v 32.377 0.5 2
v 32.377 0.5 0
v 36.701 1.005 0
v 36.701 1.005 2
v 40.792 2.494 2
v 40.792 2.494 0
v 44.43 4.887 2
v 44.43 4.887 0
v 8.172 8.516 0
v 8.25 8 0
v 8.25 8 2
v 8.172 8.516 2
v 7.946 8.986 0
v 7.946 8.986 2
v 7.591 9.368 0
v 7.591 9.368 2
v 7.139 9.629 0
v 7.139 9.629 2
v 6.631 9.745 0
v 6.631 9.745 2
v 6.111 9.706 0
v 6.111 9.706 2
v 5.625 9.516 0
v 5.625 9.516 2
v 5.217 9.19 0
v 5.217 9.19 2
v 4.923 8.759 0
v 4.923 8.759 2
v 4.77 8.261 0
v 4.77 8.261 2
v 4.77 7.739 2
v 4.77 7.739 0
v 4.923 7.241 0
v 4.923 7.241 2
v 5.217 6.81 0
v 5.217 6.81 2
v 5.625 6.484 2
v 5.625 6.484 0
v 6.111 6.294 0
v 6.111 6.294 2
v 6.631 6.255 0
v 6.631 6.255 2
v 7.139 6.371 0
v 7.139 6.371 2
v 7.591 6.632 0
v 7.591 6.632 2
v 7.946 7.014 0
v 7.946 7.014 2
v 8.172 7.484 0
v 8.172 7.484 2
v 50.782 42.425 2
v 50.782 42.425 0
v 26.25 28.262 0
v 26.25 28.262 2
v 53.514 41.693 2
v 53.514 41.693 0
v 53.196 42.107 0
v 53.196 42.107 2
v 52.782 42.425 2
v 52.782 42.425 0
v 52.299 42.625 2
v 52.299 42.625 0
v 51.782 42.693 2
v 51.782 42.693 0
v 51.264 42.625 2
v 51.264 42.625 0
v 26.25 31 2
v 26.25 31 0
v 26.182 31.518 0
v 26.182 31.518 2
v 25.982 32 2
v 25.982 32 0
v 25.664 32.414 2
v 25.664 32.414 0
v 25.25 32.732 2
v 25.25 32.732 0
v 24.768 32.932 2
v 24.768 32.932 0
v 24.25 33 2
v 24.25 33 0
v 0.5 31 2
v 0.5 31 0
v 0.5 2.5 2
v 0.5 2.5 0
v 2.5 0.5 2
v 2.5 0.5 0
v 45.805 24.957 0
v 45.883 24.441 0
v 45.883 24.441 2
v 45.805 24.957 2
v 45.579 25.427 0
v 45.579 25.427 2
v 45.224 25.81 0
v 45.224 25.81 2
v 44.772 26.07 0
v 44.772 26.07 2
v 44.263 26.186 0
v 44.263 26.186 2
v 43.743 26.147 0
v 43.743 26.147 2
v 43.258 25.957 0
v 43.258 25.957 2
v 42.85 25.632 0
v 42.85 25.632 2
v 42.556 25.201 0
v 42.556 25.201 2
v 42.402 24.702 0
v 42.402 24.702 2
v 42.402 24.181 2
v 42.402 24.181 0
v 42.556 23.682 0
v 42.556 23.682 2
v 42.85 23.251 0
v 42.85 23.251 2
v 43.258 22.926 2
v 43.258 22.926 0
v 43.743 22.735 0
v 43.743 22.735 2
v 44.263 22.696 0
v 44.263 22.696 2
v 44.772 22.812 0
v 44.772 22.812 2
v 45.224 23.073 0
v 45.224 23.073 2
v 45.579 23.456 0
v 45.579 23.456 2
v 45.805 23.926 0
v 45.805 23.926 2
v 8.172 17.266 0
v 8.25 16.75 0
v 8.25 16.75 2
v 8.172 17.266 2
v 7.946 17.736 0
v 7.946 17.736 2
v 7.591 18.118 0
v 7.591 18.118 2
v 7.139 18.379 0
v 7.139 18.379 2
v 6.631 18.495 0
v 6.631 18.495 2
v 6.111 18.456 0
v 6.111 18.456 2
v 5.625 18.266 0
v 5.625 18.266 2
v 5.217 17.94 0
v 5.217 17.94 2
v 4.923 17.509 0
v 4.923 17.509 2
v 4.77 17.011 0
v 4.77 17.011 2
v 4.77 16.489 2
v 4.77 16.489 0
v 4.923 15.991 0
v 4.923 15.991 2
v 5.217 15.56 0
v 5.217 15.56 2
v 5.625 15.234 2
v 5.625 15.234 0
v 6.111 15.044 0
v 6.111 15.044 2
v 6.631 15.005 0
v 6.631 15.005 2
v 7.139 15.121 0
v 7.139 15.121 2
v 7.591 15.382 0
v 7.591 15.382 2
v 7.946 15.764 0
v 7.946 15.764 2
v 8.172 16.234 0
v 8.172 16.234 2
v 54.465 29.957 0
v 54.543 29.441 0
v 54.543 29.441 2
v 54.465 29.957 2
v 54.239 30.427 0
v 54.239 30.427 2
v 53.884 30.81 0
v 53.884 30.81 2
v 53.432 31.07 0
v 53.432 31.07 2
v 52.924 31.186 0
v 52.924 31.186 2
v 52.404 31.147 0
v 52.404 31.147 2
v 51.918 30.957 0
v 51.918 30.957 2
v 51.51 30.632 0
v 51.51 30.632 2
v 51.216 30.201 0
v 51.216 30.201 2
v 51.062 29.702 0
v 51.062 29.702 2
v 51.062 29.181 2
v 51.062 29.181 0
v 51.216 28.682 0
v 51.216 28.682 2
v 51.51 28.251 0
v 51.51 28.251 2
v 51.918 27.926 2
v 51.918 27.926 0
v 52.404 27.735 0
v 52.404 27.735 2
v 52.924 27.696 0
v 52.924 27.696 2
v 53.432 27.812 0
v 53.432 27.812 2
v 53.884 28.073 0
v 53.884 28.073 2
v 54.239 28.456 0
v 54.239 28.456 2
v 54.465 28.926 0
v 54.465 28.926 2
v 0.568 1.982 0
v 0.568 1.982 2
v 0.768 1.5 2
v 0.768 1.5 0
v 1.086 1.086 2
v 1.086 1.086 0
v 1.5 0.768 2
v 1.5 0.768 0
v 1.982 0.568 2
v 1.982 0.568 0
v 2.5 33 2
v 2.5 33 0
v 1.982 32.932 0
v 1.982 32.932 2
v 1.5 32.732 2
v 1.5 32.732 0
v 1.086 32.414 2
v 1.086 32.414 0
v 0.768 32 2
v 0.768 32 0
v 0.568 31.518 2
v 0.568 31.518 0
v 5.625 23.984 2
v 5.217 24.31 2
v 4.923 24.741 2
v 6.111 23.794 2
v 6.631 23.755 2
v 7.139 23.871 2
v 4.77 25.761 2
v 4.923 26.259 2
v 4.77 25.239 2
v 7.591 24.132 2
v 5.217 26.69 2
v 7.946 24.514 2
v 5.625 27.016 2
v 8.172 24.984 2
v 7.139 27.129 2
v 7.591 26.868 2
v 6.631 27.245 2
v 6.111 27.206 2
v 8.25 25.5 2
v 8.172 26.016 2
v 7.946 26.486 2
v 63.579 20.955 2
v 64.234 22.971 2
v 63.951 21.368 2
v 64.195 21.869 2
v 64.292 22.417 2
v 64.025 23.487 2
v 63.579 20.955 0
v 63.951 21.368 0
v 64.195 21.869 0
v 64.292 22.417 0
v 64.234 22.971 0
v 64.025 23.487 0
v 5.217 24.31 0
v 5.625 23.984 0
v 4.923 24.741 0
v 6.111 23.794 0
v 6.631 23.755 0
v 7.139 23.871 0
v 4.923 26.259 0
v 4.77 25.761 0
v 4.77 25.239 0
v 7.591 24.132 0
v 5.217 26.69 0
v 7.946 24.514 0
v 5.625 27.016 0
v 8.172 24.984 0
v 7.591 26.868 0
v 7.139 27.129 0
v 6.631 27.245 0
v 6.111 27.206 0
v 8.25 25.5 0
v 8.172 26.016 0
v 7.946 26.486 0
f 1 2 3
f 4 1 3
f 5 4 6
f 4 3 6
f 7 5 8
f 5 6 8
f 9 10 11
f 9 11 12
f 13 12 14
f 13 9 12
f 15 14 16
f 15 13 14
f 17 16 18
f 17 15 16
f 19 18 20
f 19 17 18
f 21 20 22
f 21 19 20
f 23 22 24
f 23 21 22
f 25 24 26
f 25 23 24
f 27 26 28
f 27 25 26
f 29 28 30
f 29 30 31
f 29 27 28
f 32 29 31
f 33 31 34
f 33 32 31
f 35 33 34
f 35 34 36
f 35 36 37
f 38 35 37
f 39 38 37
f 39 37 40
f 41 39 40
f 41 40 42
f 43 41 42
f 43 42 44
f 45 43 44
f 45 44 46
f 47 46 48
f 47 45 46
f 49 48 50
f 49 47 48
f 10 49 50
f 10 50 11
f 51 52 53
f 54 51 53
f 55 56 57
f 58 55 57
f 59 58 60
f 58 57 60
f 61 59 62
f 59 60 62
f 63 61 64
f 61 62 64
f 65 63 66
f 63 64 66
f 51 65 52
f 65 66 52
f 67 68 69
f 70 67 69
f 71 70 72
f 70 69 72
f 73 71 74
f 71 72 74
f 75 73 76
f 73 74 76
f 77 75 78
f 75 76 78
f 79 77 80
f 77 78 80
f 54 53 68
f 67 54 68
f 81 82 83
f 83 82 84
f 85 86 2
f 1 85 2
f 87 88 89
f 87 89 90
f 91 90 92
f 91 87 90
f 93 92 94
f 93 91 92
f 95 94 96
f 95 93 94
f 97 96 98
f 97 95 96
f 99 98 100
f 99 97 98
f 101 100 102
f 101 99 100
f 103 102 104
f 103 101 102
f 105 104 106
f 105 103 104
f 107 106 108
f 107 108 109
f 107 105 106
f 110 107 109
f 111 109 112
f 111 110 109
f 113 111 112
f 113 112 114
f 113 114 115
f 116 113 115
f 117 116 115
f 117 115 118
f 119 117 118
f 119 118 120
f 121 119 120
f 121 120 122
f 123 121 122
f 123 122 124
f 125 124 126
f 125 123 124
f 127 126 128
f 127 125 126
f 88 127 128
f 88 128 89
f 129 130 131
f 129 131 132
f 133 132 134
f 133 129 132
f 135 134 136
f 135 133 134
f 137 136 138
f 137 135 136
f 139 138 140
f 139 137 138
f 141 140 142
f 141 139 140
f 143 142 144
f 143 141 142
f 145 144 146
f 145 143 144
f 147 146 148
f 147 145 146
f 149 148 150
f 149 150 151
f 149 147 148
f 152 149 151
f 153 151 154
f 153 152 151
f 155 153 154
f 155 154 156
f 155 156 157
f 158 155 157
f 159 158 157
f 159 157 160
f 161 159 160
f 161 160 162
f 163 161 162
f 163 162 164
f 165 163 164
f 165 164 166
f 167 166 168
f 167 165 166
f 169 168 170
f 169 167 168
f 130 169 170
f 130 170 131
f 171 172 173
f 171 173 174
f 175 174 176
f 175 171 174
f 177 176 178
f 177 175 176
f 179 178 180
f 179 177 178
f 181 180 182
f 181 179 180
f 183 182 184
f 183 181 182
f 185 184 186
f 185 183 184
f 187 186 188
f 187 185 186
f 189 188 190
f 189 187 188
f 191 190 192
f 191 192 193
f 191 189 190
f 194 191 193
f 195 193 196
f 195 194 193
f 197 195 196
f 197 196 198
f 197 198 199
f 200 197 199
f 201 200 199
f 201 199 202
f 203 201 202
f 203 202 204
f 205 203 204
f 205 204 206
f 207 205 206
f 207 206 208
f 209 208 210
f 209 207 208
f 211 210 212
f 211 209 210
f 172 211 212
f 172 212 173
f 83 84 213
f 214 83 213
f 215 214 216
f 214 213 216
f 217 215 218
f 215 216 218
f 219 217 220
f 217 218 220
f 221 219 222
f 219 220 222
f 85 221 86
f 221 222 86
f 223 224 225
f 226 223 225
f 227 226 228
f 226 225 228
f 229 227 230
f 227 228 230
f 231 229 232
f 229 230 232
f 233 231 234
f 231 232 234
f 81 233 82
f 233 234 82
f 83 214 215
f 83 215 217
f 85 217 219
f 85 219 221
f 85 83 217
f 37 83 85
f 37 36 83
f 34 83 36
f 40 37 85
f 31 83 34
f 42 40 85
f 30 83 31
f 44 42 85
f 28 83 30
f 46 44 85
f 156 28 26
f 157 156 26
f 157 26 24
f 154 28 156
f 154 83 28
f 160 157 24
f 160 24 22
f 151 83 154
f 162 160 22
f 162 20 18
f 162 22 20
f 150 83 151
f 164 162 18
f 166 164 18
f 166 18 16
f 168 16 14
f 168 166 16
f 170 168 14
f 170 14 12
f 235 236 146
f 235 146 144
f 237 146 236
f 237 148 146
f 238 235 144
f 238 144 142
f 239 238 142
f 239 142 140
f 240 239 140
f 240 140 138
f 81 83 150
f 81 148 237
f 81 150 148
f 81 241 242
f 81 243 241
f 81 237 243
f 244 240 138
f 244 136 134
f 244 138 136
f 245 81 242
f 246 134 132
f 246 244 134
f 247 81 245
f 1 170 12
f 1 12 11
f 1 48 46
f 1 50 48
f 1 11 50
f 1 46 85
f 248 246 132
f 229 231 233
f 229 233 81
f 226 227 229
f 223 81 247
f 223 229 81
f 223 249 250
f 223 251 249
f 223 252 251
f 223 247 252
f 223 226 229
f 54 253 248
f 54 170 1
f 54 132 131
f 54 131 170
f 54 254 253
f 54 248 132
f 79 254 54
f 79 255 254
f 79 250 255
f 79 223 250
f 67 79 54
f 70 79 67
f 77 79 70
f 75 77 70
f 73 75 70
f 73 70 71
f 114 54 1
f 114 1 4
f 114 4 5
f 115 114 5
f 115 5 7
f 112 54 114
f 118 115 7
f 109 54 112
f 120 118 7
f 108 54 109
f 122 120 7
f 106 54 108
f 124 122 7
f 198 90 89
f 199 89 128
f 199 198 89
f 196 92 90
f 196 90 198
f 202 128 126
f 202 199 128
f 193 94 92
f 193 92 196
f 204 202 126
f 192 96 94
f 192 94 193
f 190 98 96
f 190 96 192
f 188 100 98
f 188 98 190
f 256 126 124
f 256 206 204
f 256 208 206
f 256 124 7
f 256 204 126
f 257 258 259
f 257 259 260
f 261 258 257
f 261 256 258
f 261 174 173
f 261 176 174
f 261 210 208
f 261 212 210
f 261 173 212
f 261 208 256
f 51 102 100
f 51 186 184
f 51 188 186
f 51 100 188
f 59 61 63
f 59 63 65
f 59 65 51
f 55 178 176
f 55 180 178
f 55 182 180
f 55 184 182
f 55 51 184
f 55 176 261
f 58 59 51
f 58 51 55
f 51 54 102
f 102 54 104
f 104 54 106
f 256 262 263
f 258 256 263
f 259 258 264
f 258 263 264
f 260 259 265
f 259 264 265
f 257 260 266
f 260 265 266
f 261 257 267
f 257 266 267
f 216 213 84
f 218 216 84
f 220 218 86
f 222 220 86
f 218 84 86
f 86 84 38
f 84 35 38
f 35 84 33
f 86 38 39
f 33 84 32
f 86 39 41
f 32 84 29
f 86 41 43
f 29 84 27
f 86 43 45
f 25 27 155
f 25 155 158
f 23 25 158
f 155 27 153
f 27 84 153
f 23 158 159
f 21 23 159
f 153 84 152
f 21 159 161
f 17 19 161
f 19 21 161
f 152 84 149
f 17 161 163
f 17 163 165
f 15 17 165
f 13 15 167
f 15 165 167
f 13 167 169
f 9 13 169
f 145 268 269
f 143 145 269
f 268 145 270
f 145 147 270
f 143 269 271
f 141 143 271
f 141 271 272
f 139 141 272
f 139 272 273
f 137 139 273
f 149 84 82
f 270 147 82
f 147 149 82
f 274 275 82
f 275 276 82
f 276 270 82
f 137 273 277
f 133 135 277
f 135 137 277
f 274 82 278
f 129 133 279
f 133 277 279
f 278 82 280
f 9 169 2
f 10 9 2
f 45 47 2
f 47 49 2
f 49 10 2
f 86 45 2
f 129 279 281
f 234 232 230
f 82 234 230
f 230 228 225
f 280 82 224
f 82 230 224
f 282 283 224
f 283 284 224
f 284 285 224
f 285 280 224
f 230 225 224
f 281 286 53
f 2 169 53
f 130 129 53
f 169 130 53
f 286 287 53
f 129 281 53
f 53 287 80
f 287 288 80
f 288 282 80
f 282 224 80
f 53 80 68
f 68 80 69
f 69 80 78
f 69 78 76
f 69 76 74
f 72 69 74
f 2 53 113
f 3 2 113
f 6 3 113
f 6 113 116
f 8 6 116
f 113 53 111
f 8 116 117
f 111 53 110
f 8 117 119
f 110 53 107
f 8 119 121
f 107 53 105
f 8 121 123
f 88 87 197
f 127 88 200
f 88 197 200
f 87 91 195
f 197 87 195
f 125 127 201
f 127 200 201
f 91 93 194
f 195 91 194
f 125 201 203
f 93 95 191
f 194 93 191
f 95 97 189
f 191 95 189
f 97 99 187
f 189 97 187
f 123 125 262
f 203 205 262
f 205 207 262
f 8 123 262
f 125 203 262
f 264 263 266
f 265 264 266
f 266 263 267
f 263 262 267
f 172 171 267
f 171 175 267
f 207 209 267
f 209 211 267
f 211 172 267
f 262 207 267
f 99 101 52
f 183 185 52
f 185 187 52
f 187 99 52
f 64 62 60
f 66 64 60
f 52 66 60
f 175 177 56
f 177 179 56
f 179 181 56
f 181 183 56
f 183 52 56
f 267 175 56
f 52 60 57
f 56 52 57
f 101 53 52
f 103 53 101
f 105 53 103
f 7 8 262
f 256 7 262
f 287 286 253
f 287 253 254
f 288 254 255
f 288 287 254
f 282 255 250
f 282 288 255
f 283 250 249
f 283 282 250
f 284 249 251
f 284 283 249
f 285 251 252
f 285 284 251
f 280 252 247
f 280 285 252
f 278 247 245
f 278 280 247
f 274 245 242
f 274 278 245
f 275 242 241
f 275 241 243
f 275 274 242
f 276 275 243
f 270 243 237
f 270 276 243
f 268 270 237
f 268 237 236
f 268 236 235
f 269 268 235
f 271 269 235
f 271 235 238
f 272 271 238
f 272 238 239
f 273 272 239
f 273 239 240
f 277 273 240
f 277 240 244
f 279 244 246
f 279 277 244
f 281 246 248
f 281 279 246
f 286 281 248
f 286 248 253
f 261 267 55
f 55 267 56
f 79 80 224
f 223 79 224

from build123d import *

# Parameters (mm, degrees)
SKETCH1_R           = 1.75
BOSS_EXTRUDE1_DEPTH = 2


with BuildPart() as part:
    # Sketch1 → Boss-Extrude1 (new body)
    with BuildSketch(Plane.XY):
        with BuildLine():
            Line((24.25, 33), (2.5, 33))
            ThreePointArc((2.5, 33), (1.085786438, 32.414213562), (0.5, 31))
            Line((0.5, 31), (0.5, 2.5))
            ThreePointArc((0.5, 2.5), (1.085786438, 1.085786438), (2.5, 0.5))
            Line((2.5, 0.5), (32.377282652, 0.5))
            ThreePointArc((32.377282652, 0.5), (38.790160339, 1.63076336), (44.429550333, 4.886666692))
            Line((44.429550333, 4.886666692), (63.578598927, 20.954626304))
            ThreePointArc((63.578598927, 20.954626304), (64.262639213, 22.139418835), (64.025074515, 23.48671519))
            Line((64.025074515, 23.48671519), (53.513611416, 41.69310334))
            ThreePointArc((53.513611416, 41.69310334), (52.299198698, 42.624954992), (50.781560608, 42.425154147))
            Line((50.781560608, 42.425154147), (26.25, 28.261851027))
            Line((26.25, 28.261851027), (26.25, 31))
            ThreePointArc((26.25, 31), (25.664213562, 32.414213562), (24.25, 33))
        make_face()
        with Locations((52.79293994, 29.441342951)):
            Circle(SKETCH1_R, mode=Mode.SUBTRACT)
        with Locations((44.132685902, 24.441342951)):
            Circle(SKETCH1_R, mode=Mode.SUBTRACT)
        with Locations((6.5, 25.5)):
            Circle(SKETCH1_R, mode=Mode.SUBTRACT)
        with Locations((6.5, 16.75)):
            Circle(SKETCH1_R, mode=Mode.SUBTRACT)
        with Locations((6.5, 8)):
            Circle(SKETCH1_R, mode=Mode.SUBTRACT)
    extrude(amount=BOSS_EXTRUDE1_DEPTH)


solid = part.part
